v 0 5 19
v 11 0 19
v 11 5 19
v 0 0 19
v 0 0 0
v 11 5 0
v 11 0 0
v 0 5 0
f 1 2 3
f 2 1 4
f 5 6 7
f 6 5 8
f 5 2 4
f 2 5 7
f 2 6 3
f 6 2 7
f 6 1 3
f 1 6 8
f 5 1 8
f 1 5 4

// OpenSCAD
// Generated by SolidPython 1.0.1 on 2020-07-29 00:46:55


cube(size = [11, 5, 19]);
/***********************************************
*********      SolidPython code:      **********
************************************************
 
# import packages: SolidPython
from solid import *
from solid.utils import *
from itertools import chain, combinations, permutations


class Resize:

    def __init__(self, scad_file):
        self.scad_file = scad_file
        #self.scad_file = import_scad(scad_file)
        # cone/cylinder param:
        self.r1 = 0
        self.r2 = 0
        self.h = 0
        # rectangular prism param:
        self.w = 0
        self.l = 0
        # ellipse param:
        self.r = 0

    # import OpenScad code (file name corresponds to shape)


    # classify shape + parameters
    def assign(self, param1, param2, param3):
        if self.scad_file == 'cone.scad':
            self.r1 = param1
            self.r2 = param2
            self.h = param3
        elif self.scad_file == 'cylinder.scad':
            self.r1 = param1
            self.r2 = param2
            self.h = param3
        elif self.scad_file == 'rectangularPrism.scad':
            self.h = param1
            self.l = param2
            self.w = param3
        else:
            self.r = param1
            self.h = param2

    # resize parameters
    def iterate(self):
        x = range(3, 20, 2)
        i = 1
        if self.scad_file == 'cone.scad':
            tempList = list(permutations(x, 2))
            for temp in tempList:
                param1 = temp[0]
                param2 = temp[1]
                filepath = 'produced_scad_files/' + 'cone' + str(param1) + '_' + str(param2) + '_' + '.scad'
                scad_render_to_file(cylinder(h=param1, r1=param2, r2=0), filepath)

        elif self.scad_file == 'cylinder.scad':
            tempList = list(permutations(x, 3))
            for temp in tempList:
                param1 = temp[0]
                param2 = temp[1]
                filepath = 'produced_scad_files/' + 'cylinder' + str(param1) + '_' + str(param2) + '_' + '.scad'
                scad_render_to_file(cylinder(h=param1, r1=param2, r2=param2), filepath)

        elif self.scad_file == 'rectangularPrism.scad':
            tempList = list(permutations(x, 3))
            for temp in tempList:
                param1 = temp[0]
                param2 = temp[1]
                param3 = temp[2]
                filepath = 'produced_scad_files/' + 'rectangularPrism' + str(param1) + '_' + str(param2) + '_' + str(
                    param3) + '.scad'
                scad_render_to_file(cube(size=(param1, param2, param3)), filepath)

        elif self.scad_file == 'ellipse.scad':
            tempList = list(permutations(x, 4))
            for temp in tempList:
                param1 = temp[0]
                param2 = temp[1]
                param3 = temp[2]
                param4 = temp[3]
                filepath = 'produced_scad_files/' + 'ellipse' + str(param1) + '_' + str(param2) + '_' + str(param3) + '_' + str(param4) + '.scad'
                scad_render_to_file(scale([param1, param2, param3])(sphere(r=param4)), filepath)

    def render_to_scadfile(self):
        scad_render_to_file(scad, 'example.scad') 
 
************************************************/
